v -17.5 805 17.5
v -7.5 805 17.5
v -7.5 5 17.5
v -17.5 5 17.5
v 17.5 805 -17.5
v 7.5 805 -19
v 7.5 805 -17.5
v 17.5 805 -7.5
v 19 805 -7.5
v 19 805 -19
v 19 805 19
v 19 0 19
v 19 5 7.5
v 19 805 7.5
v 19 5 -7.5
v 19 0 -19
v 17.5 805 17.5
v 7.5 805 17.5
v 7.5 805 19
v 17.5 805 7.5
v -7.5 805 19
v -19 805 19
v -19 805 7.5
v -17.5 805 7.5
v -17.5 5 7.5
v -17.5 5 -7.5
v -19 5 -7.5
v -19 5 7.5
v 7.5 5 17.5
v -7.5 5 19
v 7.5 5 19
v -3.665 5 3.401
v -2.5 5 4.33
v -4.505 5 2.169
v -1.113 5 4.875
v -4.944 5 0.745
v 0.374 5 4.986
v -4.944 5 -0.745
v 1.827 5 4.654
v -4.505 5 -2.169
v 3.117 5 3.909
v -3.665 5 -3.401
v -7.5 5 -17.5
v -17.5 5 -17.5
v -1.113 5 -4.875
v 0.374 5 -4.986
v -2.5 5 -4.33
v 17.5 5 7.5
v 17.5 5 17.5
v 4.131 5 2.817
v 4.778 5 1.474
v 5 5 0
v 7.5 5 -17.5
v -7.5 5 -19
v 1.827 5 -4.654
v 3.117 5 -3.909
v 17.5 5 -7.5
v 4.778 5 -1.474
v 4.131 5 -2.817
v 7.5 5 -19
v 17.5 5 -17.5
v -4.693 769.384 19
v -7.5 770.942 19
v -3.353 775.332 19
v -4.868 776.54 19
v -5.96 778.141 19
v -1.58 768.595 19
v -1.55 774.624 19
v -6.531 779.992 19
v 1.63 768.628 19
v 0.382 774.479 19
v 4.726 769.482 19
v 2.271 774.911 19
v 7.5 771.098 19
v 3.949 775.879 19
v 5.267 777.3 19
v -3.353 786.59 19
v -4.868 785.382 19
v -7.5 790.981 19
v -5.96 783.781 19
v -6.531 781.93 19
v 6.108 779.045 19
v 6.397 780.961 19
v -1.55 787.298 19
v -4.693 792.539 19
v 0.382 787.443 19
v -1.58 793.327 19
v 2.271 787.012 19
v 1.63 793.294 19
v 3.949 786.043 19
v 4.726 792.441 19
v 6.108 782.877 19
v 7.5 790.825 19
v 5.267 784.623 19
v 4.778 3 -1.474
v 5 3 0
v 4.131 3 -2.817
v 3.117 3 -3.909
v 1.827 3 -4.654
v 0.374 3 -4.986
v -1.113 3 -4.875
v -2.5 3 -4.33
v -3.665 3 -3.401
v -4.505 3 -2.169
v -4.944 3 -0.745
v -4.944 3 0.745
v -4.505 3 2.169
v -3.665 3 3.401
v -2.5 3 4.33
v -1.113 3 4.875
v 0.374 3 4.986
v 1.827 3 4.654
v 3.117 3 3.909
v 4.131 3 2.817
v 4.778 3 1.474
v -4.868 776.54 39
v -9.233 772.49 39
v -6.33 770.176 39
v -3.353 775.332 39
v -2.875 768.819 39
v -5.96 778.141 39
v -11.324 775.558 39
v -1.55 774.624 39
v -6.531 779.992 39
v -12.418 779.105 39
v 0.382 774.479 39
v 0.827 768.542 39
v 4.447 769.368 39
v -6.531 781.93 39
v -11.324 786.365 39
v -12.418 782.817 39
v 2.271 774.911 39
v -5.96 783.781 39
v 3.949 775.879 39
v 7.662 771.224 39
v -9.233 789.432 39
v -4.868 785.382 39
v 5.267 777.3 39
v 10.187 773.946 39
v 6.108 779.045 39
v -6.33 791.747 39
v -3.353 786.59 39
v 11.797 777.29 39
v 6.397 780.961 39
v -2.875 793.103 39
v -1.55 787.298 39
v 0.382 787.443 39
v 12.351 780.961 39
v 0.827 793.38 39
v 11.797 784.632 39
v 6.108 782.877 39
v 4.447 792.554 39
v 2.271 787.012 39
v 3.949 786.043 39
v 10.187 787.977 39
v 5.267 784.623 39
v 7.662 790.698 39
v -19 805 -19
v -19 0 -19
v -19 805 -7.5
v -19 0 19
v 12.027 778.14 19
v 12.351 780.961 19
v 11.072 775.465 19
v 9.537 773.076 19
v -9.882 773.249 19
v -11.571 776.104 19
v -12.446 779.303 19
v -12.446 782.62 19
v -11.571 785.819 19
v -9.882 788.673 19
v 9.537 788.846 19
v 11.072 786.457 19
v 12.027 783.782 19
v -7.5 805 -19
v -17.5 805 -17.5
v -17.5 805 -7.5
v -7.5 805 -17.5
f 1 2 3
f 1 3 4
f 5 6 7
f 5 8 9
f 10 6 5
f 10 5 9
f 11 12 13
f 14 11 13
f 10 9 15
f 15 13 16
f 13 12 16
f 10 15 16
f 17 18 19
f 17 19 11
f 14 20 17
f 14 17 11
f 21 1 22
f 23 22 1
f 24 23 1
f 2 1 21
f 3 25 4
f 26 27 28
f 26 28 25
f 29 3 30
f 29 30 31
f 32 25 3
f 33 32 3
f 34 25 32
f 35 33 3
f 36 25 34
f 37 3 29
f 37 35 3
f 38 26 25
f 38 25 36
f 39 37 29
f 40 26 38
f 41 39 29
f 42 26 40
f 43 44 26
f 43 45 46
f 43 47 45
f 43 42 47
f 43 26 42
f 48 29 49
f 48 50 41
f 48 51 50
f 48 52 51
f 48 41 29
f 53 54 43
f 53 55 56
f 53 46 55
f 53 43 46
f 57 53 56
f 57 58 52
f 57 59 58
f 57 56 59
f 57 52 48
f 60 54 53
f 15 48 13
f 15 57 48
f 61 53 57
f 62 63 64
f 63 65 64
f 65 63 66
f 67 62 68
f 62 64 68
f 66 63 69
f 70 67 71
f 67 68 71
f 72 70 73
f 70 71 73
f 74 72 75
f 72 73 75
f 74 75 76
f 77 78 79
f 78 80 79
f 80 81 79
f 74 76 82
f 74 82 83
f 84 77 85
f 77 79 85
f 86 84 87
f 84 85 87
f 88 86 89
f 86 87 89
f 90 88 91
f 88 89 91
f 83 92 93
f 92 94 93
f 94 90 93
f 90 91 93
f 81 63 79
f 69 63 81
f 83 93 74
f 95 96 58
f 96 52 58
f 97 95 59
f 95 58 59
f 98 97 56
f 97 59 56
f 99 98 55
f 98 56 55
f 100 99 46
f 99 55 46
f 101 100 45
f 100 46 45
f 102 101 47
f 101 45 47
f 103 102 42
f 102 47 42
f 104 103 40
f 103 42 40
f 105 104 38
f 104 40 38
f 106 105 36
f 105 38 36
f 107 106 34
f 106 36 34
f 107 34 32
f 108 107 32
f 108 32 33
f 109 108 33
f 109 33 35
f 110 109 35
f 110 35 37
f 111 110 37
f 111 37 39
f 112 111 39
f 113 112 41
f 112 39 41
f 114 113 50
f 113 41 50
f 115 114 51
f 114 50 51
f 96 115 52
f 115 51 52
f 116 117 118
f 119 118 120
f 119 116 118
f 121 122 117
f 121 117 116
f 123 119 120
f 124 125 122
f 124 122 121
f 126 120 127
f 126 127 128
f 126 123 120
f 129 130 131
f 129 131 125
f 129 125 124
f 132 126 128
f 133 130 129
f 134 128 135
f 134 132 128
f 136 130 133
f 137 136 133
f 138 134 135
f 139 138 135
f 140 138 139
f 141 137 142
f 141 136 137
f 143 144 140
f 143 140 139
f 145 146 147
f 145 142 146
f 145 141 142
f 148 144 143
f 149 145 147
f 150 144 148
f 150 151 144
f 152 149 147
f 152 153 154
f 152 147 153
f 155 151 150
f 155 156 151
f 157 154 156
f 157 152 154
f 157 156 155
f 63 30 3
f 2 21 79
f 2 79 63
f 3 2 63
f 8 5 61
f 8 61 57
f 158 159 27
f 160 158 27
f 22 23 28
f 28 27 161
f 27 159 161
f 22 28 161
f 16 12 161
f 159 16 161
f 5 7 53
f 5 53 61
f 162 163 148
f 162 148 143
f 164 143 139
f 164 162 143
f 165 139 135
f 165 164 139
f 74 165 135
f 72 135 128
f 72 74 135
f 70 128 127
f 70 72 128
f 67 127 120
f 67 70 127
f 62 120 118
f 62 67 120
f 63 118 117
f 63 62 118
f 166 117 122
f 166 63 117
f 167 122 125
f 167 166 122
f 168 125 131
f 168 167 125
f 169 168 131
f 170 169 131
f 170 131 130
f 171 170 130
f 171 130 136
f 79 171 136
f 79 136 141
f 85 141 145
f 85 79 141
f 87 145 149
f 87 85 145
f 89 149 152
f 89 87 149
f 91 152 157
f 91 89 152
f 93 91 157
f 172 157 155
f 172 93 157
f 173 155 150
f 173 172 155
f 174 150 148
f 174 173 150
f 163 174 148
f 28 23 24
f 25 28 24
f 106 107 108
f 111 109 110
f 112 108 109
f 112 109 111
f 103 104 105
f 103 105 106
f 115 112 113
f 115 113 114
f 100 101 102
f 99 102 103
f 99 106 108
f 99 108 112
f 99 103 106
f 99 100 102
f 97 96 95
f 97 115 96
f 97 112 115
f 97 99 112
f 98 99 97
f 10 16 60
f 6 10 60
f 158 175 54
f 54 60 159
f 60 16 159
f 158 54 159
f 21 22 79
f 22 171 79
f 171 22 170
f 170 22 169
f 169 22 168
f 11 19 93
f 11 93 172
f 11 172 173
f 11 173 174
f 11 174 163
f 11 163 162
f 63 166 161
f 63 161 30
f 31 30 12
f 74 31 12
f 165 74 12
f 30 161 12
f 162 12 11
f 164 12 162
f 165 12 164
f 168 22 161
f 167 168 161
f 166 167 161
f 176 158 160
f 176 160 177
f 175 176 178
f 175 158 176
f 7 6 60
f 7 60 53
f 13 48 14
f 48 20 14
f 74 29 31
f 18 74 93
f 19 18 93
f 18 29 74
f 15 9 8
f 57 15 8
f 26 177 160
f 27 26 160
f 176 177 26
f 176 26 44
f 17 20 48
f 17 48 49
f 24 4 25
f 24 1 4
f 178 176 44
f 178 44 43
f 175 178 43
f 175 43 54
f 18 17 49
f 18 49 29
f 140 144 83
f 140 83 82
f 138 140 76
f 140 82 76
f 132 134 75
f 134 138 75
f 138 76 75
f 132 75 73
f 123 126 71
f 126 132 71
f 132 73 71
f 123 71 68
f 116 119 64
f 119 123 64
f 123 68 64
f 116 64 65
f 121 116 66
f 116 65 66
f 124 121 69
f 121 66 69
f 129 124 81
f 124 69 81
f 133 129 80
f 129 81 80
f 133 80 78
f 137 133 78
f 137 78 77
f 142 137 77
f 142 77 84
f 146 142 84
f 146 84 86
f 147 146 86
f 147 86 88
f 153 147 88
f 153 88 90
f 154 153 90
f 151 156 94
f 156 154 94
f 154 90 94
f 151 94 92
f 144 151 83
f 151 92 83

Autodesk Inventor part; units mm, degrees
ref_plane "YZ Plane" through (0, 0, 0) normal (1, 0, 0) x (0, 1, 0)
ref_plane "XZ Plane" through (0, 0, 0) normal (0, 1, 0) x (-1, 0, 0)
ref_plane "XY Plane" through (0, 0, 0) normal (0, 0, 1) x (1, 0, 0)
sketch "Sketch1" plane through (0, 0, 0) normal (0, 1, 0) x (-1, 0, 0)
  line L0 (-19, -19) -> (19, -19)
  line L1 (19, -19) -> (19, 19)
  line L2 (19, 19) -> (-19, 19)
  line L3 (-19, 19) -> (-19, -19)
  line L4 (-19, -19) -> (19, 19) construction
  line L5 (19, -19) -> (-19, 19) construction
  point P0 (0, 0)
  dimension "d0" = 38
  dimension "d1" = 38
extrude "Extrusion1" add sketch "Sketch1" along normal blind 5
sketch "Sketch5" plane through (0, 5, 0) normal (0, 1, 0) x (1, 0, 0)
  line L0 (-19, -19) -> (19, -19) projected
  line L1 (-19, 19) -> (19, 19)
  line L2 (19, 19) -> (19, -19)
  line L3 (19, -19) -> (-19, -19)
  line L4 (-19, -19) -> (-19, 19)
  line L5 (-19, 19) -> (19, -19) construction
  line L6 (19, 19) -> (-19, -19) construction
  point P0 (0, 0)
extrude "Extrusion5" add sketch "Sketch5" along normal blind 800
sketch "Sketch6" plane through (0, 805, 0) normal (0, 1, 0) x (1, 0, 0)
  line L0 (-7.5, 27.5) -> (7.5, 27.5)
  line L1 (7.5, -27.5) -> (-7.5, -27.5)
  line L2 (-7.5, 27.5) -> (7.5, -27.5) construction
  line L3 (7.5, 27.5) -> (-7.5, -27.5) construction
  line L4 (-27.5, 7.5) -> (-27.5, -7.5)
  line L5 (27.5, -7.5) -> (27.5, 7.5)
  line L6 (27.5, 7.5) -> (-27.5, -7.5) construction
  line L7 (-27.5, 7.5) -> (27.5, -7.5) construction
  line L8 (-27.5, -7.5) -> (-7.5, -7.5)
  line L9 (7.5, -7.5) -> (27.5, -7.5)
  line L10 (7.5, 27.5) -> (7.5, 7.5)
  line L11 (7.5, -7.5) -> (7.5, -27.5)
  line L12 (27.5, 7.5) -> (7.5, 7.5)
  line L13 (-7.5, 7.5) -> (-27.5, 7.5)
  line L14 (-7.5, -27.5) -> (-7.5, -7.5)
  line L15 (-7.5, 7.5) -> (-7.5, 27.5)
  point P0 (0, 0)
  dimension "d20" = 15
  dimension "d21" = 55
  dimension "d22" = 55
  dimension "d23" = 15
sketch "Sketch7" plane through (0, 805, 0) normal (0, 1, 0) x (1, 0, 0)
  line L0 (-17.5, 17.5) -> (17.5, 17.5)
  line L1 (17.5, 17.5) -> (17.5, -17.5)
  line L2 (17.5, -17.5) -> (-17.5, -17.5)
  line L3 (-17.5, -17.5) -> (-17.5, 17.5)
  line L4 (-17.5, 17.5) -> (17.5, -17.5) construction
  line L5 (17.5, 17.5) -> (-17.5, -17.5) construction
  point P0 (0, 0)
  dimension "d24" = 35
  dimension "d25" = 35
extrude "Extrusion6" cut sketch "Sketch7" against normal blind 800
extrude "Extrusion7" cut sketch "Sketch6" against normal blind 800
sketch "Sketch8" plane through (0, 5, 0) normal (0, 1, 0) x (1, 0, 0)
  circle A0 centre (0, 0) radius 5
  dimension "d30" = 10
extrude "Extrusion8" cut sketch "Sketch8" against normal blind 2
sketch "Sketch9" plane through (-19, 0, 19) normal (0, 0, 1) x (1, 0, 0)
  line L0 (-0.2068, 780.9612) -> (38, 780.9612) construction
  line L1 (38, 0) -> (38, 805) projected
  circle A0 centre (18.8966, 780.9612) radius 6.5
  circle A1 centre (18.8966, 780.9612) radius 12.454
  point P0 (19, 0)
  dimension "d33" = 13
extrude "Extrusion9" add sketch "Sketch9" along normal blind 20
properties part number "marble_lift_outer"
